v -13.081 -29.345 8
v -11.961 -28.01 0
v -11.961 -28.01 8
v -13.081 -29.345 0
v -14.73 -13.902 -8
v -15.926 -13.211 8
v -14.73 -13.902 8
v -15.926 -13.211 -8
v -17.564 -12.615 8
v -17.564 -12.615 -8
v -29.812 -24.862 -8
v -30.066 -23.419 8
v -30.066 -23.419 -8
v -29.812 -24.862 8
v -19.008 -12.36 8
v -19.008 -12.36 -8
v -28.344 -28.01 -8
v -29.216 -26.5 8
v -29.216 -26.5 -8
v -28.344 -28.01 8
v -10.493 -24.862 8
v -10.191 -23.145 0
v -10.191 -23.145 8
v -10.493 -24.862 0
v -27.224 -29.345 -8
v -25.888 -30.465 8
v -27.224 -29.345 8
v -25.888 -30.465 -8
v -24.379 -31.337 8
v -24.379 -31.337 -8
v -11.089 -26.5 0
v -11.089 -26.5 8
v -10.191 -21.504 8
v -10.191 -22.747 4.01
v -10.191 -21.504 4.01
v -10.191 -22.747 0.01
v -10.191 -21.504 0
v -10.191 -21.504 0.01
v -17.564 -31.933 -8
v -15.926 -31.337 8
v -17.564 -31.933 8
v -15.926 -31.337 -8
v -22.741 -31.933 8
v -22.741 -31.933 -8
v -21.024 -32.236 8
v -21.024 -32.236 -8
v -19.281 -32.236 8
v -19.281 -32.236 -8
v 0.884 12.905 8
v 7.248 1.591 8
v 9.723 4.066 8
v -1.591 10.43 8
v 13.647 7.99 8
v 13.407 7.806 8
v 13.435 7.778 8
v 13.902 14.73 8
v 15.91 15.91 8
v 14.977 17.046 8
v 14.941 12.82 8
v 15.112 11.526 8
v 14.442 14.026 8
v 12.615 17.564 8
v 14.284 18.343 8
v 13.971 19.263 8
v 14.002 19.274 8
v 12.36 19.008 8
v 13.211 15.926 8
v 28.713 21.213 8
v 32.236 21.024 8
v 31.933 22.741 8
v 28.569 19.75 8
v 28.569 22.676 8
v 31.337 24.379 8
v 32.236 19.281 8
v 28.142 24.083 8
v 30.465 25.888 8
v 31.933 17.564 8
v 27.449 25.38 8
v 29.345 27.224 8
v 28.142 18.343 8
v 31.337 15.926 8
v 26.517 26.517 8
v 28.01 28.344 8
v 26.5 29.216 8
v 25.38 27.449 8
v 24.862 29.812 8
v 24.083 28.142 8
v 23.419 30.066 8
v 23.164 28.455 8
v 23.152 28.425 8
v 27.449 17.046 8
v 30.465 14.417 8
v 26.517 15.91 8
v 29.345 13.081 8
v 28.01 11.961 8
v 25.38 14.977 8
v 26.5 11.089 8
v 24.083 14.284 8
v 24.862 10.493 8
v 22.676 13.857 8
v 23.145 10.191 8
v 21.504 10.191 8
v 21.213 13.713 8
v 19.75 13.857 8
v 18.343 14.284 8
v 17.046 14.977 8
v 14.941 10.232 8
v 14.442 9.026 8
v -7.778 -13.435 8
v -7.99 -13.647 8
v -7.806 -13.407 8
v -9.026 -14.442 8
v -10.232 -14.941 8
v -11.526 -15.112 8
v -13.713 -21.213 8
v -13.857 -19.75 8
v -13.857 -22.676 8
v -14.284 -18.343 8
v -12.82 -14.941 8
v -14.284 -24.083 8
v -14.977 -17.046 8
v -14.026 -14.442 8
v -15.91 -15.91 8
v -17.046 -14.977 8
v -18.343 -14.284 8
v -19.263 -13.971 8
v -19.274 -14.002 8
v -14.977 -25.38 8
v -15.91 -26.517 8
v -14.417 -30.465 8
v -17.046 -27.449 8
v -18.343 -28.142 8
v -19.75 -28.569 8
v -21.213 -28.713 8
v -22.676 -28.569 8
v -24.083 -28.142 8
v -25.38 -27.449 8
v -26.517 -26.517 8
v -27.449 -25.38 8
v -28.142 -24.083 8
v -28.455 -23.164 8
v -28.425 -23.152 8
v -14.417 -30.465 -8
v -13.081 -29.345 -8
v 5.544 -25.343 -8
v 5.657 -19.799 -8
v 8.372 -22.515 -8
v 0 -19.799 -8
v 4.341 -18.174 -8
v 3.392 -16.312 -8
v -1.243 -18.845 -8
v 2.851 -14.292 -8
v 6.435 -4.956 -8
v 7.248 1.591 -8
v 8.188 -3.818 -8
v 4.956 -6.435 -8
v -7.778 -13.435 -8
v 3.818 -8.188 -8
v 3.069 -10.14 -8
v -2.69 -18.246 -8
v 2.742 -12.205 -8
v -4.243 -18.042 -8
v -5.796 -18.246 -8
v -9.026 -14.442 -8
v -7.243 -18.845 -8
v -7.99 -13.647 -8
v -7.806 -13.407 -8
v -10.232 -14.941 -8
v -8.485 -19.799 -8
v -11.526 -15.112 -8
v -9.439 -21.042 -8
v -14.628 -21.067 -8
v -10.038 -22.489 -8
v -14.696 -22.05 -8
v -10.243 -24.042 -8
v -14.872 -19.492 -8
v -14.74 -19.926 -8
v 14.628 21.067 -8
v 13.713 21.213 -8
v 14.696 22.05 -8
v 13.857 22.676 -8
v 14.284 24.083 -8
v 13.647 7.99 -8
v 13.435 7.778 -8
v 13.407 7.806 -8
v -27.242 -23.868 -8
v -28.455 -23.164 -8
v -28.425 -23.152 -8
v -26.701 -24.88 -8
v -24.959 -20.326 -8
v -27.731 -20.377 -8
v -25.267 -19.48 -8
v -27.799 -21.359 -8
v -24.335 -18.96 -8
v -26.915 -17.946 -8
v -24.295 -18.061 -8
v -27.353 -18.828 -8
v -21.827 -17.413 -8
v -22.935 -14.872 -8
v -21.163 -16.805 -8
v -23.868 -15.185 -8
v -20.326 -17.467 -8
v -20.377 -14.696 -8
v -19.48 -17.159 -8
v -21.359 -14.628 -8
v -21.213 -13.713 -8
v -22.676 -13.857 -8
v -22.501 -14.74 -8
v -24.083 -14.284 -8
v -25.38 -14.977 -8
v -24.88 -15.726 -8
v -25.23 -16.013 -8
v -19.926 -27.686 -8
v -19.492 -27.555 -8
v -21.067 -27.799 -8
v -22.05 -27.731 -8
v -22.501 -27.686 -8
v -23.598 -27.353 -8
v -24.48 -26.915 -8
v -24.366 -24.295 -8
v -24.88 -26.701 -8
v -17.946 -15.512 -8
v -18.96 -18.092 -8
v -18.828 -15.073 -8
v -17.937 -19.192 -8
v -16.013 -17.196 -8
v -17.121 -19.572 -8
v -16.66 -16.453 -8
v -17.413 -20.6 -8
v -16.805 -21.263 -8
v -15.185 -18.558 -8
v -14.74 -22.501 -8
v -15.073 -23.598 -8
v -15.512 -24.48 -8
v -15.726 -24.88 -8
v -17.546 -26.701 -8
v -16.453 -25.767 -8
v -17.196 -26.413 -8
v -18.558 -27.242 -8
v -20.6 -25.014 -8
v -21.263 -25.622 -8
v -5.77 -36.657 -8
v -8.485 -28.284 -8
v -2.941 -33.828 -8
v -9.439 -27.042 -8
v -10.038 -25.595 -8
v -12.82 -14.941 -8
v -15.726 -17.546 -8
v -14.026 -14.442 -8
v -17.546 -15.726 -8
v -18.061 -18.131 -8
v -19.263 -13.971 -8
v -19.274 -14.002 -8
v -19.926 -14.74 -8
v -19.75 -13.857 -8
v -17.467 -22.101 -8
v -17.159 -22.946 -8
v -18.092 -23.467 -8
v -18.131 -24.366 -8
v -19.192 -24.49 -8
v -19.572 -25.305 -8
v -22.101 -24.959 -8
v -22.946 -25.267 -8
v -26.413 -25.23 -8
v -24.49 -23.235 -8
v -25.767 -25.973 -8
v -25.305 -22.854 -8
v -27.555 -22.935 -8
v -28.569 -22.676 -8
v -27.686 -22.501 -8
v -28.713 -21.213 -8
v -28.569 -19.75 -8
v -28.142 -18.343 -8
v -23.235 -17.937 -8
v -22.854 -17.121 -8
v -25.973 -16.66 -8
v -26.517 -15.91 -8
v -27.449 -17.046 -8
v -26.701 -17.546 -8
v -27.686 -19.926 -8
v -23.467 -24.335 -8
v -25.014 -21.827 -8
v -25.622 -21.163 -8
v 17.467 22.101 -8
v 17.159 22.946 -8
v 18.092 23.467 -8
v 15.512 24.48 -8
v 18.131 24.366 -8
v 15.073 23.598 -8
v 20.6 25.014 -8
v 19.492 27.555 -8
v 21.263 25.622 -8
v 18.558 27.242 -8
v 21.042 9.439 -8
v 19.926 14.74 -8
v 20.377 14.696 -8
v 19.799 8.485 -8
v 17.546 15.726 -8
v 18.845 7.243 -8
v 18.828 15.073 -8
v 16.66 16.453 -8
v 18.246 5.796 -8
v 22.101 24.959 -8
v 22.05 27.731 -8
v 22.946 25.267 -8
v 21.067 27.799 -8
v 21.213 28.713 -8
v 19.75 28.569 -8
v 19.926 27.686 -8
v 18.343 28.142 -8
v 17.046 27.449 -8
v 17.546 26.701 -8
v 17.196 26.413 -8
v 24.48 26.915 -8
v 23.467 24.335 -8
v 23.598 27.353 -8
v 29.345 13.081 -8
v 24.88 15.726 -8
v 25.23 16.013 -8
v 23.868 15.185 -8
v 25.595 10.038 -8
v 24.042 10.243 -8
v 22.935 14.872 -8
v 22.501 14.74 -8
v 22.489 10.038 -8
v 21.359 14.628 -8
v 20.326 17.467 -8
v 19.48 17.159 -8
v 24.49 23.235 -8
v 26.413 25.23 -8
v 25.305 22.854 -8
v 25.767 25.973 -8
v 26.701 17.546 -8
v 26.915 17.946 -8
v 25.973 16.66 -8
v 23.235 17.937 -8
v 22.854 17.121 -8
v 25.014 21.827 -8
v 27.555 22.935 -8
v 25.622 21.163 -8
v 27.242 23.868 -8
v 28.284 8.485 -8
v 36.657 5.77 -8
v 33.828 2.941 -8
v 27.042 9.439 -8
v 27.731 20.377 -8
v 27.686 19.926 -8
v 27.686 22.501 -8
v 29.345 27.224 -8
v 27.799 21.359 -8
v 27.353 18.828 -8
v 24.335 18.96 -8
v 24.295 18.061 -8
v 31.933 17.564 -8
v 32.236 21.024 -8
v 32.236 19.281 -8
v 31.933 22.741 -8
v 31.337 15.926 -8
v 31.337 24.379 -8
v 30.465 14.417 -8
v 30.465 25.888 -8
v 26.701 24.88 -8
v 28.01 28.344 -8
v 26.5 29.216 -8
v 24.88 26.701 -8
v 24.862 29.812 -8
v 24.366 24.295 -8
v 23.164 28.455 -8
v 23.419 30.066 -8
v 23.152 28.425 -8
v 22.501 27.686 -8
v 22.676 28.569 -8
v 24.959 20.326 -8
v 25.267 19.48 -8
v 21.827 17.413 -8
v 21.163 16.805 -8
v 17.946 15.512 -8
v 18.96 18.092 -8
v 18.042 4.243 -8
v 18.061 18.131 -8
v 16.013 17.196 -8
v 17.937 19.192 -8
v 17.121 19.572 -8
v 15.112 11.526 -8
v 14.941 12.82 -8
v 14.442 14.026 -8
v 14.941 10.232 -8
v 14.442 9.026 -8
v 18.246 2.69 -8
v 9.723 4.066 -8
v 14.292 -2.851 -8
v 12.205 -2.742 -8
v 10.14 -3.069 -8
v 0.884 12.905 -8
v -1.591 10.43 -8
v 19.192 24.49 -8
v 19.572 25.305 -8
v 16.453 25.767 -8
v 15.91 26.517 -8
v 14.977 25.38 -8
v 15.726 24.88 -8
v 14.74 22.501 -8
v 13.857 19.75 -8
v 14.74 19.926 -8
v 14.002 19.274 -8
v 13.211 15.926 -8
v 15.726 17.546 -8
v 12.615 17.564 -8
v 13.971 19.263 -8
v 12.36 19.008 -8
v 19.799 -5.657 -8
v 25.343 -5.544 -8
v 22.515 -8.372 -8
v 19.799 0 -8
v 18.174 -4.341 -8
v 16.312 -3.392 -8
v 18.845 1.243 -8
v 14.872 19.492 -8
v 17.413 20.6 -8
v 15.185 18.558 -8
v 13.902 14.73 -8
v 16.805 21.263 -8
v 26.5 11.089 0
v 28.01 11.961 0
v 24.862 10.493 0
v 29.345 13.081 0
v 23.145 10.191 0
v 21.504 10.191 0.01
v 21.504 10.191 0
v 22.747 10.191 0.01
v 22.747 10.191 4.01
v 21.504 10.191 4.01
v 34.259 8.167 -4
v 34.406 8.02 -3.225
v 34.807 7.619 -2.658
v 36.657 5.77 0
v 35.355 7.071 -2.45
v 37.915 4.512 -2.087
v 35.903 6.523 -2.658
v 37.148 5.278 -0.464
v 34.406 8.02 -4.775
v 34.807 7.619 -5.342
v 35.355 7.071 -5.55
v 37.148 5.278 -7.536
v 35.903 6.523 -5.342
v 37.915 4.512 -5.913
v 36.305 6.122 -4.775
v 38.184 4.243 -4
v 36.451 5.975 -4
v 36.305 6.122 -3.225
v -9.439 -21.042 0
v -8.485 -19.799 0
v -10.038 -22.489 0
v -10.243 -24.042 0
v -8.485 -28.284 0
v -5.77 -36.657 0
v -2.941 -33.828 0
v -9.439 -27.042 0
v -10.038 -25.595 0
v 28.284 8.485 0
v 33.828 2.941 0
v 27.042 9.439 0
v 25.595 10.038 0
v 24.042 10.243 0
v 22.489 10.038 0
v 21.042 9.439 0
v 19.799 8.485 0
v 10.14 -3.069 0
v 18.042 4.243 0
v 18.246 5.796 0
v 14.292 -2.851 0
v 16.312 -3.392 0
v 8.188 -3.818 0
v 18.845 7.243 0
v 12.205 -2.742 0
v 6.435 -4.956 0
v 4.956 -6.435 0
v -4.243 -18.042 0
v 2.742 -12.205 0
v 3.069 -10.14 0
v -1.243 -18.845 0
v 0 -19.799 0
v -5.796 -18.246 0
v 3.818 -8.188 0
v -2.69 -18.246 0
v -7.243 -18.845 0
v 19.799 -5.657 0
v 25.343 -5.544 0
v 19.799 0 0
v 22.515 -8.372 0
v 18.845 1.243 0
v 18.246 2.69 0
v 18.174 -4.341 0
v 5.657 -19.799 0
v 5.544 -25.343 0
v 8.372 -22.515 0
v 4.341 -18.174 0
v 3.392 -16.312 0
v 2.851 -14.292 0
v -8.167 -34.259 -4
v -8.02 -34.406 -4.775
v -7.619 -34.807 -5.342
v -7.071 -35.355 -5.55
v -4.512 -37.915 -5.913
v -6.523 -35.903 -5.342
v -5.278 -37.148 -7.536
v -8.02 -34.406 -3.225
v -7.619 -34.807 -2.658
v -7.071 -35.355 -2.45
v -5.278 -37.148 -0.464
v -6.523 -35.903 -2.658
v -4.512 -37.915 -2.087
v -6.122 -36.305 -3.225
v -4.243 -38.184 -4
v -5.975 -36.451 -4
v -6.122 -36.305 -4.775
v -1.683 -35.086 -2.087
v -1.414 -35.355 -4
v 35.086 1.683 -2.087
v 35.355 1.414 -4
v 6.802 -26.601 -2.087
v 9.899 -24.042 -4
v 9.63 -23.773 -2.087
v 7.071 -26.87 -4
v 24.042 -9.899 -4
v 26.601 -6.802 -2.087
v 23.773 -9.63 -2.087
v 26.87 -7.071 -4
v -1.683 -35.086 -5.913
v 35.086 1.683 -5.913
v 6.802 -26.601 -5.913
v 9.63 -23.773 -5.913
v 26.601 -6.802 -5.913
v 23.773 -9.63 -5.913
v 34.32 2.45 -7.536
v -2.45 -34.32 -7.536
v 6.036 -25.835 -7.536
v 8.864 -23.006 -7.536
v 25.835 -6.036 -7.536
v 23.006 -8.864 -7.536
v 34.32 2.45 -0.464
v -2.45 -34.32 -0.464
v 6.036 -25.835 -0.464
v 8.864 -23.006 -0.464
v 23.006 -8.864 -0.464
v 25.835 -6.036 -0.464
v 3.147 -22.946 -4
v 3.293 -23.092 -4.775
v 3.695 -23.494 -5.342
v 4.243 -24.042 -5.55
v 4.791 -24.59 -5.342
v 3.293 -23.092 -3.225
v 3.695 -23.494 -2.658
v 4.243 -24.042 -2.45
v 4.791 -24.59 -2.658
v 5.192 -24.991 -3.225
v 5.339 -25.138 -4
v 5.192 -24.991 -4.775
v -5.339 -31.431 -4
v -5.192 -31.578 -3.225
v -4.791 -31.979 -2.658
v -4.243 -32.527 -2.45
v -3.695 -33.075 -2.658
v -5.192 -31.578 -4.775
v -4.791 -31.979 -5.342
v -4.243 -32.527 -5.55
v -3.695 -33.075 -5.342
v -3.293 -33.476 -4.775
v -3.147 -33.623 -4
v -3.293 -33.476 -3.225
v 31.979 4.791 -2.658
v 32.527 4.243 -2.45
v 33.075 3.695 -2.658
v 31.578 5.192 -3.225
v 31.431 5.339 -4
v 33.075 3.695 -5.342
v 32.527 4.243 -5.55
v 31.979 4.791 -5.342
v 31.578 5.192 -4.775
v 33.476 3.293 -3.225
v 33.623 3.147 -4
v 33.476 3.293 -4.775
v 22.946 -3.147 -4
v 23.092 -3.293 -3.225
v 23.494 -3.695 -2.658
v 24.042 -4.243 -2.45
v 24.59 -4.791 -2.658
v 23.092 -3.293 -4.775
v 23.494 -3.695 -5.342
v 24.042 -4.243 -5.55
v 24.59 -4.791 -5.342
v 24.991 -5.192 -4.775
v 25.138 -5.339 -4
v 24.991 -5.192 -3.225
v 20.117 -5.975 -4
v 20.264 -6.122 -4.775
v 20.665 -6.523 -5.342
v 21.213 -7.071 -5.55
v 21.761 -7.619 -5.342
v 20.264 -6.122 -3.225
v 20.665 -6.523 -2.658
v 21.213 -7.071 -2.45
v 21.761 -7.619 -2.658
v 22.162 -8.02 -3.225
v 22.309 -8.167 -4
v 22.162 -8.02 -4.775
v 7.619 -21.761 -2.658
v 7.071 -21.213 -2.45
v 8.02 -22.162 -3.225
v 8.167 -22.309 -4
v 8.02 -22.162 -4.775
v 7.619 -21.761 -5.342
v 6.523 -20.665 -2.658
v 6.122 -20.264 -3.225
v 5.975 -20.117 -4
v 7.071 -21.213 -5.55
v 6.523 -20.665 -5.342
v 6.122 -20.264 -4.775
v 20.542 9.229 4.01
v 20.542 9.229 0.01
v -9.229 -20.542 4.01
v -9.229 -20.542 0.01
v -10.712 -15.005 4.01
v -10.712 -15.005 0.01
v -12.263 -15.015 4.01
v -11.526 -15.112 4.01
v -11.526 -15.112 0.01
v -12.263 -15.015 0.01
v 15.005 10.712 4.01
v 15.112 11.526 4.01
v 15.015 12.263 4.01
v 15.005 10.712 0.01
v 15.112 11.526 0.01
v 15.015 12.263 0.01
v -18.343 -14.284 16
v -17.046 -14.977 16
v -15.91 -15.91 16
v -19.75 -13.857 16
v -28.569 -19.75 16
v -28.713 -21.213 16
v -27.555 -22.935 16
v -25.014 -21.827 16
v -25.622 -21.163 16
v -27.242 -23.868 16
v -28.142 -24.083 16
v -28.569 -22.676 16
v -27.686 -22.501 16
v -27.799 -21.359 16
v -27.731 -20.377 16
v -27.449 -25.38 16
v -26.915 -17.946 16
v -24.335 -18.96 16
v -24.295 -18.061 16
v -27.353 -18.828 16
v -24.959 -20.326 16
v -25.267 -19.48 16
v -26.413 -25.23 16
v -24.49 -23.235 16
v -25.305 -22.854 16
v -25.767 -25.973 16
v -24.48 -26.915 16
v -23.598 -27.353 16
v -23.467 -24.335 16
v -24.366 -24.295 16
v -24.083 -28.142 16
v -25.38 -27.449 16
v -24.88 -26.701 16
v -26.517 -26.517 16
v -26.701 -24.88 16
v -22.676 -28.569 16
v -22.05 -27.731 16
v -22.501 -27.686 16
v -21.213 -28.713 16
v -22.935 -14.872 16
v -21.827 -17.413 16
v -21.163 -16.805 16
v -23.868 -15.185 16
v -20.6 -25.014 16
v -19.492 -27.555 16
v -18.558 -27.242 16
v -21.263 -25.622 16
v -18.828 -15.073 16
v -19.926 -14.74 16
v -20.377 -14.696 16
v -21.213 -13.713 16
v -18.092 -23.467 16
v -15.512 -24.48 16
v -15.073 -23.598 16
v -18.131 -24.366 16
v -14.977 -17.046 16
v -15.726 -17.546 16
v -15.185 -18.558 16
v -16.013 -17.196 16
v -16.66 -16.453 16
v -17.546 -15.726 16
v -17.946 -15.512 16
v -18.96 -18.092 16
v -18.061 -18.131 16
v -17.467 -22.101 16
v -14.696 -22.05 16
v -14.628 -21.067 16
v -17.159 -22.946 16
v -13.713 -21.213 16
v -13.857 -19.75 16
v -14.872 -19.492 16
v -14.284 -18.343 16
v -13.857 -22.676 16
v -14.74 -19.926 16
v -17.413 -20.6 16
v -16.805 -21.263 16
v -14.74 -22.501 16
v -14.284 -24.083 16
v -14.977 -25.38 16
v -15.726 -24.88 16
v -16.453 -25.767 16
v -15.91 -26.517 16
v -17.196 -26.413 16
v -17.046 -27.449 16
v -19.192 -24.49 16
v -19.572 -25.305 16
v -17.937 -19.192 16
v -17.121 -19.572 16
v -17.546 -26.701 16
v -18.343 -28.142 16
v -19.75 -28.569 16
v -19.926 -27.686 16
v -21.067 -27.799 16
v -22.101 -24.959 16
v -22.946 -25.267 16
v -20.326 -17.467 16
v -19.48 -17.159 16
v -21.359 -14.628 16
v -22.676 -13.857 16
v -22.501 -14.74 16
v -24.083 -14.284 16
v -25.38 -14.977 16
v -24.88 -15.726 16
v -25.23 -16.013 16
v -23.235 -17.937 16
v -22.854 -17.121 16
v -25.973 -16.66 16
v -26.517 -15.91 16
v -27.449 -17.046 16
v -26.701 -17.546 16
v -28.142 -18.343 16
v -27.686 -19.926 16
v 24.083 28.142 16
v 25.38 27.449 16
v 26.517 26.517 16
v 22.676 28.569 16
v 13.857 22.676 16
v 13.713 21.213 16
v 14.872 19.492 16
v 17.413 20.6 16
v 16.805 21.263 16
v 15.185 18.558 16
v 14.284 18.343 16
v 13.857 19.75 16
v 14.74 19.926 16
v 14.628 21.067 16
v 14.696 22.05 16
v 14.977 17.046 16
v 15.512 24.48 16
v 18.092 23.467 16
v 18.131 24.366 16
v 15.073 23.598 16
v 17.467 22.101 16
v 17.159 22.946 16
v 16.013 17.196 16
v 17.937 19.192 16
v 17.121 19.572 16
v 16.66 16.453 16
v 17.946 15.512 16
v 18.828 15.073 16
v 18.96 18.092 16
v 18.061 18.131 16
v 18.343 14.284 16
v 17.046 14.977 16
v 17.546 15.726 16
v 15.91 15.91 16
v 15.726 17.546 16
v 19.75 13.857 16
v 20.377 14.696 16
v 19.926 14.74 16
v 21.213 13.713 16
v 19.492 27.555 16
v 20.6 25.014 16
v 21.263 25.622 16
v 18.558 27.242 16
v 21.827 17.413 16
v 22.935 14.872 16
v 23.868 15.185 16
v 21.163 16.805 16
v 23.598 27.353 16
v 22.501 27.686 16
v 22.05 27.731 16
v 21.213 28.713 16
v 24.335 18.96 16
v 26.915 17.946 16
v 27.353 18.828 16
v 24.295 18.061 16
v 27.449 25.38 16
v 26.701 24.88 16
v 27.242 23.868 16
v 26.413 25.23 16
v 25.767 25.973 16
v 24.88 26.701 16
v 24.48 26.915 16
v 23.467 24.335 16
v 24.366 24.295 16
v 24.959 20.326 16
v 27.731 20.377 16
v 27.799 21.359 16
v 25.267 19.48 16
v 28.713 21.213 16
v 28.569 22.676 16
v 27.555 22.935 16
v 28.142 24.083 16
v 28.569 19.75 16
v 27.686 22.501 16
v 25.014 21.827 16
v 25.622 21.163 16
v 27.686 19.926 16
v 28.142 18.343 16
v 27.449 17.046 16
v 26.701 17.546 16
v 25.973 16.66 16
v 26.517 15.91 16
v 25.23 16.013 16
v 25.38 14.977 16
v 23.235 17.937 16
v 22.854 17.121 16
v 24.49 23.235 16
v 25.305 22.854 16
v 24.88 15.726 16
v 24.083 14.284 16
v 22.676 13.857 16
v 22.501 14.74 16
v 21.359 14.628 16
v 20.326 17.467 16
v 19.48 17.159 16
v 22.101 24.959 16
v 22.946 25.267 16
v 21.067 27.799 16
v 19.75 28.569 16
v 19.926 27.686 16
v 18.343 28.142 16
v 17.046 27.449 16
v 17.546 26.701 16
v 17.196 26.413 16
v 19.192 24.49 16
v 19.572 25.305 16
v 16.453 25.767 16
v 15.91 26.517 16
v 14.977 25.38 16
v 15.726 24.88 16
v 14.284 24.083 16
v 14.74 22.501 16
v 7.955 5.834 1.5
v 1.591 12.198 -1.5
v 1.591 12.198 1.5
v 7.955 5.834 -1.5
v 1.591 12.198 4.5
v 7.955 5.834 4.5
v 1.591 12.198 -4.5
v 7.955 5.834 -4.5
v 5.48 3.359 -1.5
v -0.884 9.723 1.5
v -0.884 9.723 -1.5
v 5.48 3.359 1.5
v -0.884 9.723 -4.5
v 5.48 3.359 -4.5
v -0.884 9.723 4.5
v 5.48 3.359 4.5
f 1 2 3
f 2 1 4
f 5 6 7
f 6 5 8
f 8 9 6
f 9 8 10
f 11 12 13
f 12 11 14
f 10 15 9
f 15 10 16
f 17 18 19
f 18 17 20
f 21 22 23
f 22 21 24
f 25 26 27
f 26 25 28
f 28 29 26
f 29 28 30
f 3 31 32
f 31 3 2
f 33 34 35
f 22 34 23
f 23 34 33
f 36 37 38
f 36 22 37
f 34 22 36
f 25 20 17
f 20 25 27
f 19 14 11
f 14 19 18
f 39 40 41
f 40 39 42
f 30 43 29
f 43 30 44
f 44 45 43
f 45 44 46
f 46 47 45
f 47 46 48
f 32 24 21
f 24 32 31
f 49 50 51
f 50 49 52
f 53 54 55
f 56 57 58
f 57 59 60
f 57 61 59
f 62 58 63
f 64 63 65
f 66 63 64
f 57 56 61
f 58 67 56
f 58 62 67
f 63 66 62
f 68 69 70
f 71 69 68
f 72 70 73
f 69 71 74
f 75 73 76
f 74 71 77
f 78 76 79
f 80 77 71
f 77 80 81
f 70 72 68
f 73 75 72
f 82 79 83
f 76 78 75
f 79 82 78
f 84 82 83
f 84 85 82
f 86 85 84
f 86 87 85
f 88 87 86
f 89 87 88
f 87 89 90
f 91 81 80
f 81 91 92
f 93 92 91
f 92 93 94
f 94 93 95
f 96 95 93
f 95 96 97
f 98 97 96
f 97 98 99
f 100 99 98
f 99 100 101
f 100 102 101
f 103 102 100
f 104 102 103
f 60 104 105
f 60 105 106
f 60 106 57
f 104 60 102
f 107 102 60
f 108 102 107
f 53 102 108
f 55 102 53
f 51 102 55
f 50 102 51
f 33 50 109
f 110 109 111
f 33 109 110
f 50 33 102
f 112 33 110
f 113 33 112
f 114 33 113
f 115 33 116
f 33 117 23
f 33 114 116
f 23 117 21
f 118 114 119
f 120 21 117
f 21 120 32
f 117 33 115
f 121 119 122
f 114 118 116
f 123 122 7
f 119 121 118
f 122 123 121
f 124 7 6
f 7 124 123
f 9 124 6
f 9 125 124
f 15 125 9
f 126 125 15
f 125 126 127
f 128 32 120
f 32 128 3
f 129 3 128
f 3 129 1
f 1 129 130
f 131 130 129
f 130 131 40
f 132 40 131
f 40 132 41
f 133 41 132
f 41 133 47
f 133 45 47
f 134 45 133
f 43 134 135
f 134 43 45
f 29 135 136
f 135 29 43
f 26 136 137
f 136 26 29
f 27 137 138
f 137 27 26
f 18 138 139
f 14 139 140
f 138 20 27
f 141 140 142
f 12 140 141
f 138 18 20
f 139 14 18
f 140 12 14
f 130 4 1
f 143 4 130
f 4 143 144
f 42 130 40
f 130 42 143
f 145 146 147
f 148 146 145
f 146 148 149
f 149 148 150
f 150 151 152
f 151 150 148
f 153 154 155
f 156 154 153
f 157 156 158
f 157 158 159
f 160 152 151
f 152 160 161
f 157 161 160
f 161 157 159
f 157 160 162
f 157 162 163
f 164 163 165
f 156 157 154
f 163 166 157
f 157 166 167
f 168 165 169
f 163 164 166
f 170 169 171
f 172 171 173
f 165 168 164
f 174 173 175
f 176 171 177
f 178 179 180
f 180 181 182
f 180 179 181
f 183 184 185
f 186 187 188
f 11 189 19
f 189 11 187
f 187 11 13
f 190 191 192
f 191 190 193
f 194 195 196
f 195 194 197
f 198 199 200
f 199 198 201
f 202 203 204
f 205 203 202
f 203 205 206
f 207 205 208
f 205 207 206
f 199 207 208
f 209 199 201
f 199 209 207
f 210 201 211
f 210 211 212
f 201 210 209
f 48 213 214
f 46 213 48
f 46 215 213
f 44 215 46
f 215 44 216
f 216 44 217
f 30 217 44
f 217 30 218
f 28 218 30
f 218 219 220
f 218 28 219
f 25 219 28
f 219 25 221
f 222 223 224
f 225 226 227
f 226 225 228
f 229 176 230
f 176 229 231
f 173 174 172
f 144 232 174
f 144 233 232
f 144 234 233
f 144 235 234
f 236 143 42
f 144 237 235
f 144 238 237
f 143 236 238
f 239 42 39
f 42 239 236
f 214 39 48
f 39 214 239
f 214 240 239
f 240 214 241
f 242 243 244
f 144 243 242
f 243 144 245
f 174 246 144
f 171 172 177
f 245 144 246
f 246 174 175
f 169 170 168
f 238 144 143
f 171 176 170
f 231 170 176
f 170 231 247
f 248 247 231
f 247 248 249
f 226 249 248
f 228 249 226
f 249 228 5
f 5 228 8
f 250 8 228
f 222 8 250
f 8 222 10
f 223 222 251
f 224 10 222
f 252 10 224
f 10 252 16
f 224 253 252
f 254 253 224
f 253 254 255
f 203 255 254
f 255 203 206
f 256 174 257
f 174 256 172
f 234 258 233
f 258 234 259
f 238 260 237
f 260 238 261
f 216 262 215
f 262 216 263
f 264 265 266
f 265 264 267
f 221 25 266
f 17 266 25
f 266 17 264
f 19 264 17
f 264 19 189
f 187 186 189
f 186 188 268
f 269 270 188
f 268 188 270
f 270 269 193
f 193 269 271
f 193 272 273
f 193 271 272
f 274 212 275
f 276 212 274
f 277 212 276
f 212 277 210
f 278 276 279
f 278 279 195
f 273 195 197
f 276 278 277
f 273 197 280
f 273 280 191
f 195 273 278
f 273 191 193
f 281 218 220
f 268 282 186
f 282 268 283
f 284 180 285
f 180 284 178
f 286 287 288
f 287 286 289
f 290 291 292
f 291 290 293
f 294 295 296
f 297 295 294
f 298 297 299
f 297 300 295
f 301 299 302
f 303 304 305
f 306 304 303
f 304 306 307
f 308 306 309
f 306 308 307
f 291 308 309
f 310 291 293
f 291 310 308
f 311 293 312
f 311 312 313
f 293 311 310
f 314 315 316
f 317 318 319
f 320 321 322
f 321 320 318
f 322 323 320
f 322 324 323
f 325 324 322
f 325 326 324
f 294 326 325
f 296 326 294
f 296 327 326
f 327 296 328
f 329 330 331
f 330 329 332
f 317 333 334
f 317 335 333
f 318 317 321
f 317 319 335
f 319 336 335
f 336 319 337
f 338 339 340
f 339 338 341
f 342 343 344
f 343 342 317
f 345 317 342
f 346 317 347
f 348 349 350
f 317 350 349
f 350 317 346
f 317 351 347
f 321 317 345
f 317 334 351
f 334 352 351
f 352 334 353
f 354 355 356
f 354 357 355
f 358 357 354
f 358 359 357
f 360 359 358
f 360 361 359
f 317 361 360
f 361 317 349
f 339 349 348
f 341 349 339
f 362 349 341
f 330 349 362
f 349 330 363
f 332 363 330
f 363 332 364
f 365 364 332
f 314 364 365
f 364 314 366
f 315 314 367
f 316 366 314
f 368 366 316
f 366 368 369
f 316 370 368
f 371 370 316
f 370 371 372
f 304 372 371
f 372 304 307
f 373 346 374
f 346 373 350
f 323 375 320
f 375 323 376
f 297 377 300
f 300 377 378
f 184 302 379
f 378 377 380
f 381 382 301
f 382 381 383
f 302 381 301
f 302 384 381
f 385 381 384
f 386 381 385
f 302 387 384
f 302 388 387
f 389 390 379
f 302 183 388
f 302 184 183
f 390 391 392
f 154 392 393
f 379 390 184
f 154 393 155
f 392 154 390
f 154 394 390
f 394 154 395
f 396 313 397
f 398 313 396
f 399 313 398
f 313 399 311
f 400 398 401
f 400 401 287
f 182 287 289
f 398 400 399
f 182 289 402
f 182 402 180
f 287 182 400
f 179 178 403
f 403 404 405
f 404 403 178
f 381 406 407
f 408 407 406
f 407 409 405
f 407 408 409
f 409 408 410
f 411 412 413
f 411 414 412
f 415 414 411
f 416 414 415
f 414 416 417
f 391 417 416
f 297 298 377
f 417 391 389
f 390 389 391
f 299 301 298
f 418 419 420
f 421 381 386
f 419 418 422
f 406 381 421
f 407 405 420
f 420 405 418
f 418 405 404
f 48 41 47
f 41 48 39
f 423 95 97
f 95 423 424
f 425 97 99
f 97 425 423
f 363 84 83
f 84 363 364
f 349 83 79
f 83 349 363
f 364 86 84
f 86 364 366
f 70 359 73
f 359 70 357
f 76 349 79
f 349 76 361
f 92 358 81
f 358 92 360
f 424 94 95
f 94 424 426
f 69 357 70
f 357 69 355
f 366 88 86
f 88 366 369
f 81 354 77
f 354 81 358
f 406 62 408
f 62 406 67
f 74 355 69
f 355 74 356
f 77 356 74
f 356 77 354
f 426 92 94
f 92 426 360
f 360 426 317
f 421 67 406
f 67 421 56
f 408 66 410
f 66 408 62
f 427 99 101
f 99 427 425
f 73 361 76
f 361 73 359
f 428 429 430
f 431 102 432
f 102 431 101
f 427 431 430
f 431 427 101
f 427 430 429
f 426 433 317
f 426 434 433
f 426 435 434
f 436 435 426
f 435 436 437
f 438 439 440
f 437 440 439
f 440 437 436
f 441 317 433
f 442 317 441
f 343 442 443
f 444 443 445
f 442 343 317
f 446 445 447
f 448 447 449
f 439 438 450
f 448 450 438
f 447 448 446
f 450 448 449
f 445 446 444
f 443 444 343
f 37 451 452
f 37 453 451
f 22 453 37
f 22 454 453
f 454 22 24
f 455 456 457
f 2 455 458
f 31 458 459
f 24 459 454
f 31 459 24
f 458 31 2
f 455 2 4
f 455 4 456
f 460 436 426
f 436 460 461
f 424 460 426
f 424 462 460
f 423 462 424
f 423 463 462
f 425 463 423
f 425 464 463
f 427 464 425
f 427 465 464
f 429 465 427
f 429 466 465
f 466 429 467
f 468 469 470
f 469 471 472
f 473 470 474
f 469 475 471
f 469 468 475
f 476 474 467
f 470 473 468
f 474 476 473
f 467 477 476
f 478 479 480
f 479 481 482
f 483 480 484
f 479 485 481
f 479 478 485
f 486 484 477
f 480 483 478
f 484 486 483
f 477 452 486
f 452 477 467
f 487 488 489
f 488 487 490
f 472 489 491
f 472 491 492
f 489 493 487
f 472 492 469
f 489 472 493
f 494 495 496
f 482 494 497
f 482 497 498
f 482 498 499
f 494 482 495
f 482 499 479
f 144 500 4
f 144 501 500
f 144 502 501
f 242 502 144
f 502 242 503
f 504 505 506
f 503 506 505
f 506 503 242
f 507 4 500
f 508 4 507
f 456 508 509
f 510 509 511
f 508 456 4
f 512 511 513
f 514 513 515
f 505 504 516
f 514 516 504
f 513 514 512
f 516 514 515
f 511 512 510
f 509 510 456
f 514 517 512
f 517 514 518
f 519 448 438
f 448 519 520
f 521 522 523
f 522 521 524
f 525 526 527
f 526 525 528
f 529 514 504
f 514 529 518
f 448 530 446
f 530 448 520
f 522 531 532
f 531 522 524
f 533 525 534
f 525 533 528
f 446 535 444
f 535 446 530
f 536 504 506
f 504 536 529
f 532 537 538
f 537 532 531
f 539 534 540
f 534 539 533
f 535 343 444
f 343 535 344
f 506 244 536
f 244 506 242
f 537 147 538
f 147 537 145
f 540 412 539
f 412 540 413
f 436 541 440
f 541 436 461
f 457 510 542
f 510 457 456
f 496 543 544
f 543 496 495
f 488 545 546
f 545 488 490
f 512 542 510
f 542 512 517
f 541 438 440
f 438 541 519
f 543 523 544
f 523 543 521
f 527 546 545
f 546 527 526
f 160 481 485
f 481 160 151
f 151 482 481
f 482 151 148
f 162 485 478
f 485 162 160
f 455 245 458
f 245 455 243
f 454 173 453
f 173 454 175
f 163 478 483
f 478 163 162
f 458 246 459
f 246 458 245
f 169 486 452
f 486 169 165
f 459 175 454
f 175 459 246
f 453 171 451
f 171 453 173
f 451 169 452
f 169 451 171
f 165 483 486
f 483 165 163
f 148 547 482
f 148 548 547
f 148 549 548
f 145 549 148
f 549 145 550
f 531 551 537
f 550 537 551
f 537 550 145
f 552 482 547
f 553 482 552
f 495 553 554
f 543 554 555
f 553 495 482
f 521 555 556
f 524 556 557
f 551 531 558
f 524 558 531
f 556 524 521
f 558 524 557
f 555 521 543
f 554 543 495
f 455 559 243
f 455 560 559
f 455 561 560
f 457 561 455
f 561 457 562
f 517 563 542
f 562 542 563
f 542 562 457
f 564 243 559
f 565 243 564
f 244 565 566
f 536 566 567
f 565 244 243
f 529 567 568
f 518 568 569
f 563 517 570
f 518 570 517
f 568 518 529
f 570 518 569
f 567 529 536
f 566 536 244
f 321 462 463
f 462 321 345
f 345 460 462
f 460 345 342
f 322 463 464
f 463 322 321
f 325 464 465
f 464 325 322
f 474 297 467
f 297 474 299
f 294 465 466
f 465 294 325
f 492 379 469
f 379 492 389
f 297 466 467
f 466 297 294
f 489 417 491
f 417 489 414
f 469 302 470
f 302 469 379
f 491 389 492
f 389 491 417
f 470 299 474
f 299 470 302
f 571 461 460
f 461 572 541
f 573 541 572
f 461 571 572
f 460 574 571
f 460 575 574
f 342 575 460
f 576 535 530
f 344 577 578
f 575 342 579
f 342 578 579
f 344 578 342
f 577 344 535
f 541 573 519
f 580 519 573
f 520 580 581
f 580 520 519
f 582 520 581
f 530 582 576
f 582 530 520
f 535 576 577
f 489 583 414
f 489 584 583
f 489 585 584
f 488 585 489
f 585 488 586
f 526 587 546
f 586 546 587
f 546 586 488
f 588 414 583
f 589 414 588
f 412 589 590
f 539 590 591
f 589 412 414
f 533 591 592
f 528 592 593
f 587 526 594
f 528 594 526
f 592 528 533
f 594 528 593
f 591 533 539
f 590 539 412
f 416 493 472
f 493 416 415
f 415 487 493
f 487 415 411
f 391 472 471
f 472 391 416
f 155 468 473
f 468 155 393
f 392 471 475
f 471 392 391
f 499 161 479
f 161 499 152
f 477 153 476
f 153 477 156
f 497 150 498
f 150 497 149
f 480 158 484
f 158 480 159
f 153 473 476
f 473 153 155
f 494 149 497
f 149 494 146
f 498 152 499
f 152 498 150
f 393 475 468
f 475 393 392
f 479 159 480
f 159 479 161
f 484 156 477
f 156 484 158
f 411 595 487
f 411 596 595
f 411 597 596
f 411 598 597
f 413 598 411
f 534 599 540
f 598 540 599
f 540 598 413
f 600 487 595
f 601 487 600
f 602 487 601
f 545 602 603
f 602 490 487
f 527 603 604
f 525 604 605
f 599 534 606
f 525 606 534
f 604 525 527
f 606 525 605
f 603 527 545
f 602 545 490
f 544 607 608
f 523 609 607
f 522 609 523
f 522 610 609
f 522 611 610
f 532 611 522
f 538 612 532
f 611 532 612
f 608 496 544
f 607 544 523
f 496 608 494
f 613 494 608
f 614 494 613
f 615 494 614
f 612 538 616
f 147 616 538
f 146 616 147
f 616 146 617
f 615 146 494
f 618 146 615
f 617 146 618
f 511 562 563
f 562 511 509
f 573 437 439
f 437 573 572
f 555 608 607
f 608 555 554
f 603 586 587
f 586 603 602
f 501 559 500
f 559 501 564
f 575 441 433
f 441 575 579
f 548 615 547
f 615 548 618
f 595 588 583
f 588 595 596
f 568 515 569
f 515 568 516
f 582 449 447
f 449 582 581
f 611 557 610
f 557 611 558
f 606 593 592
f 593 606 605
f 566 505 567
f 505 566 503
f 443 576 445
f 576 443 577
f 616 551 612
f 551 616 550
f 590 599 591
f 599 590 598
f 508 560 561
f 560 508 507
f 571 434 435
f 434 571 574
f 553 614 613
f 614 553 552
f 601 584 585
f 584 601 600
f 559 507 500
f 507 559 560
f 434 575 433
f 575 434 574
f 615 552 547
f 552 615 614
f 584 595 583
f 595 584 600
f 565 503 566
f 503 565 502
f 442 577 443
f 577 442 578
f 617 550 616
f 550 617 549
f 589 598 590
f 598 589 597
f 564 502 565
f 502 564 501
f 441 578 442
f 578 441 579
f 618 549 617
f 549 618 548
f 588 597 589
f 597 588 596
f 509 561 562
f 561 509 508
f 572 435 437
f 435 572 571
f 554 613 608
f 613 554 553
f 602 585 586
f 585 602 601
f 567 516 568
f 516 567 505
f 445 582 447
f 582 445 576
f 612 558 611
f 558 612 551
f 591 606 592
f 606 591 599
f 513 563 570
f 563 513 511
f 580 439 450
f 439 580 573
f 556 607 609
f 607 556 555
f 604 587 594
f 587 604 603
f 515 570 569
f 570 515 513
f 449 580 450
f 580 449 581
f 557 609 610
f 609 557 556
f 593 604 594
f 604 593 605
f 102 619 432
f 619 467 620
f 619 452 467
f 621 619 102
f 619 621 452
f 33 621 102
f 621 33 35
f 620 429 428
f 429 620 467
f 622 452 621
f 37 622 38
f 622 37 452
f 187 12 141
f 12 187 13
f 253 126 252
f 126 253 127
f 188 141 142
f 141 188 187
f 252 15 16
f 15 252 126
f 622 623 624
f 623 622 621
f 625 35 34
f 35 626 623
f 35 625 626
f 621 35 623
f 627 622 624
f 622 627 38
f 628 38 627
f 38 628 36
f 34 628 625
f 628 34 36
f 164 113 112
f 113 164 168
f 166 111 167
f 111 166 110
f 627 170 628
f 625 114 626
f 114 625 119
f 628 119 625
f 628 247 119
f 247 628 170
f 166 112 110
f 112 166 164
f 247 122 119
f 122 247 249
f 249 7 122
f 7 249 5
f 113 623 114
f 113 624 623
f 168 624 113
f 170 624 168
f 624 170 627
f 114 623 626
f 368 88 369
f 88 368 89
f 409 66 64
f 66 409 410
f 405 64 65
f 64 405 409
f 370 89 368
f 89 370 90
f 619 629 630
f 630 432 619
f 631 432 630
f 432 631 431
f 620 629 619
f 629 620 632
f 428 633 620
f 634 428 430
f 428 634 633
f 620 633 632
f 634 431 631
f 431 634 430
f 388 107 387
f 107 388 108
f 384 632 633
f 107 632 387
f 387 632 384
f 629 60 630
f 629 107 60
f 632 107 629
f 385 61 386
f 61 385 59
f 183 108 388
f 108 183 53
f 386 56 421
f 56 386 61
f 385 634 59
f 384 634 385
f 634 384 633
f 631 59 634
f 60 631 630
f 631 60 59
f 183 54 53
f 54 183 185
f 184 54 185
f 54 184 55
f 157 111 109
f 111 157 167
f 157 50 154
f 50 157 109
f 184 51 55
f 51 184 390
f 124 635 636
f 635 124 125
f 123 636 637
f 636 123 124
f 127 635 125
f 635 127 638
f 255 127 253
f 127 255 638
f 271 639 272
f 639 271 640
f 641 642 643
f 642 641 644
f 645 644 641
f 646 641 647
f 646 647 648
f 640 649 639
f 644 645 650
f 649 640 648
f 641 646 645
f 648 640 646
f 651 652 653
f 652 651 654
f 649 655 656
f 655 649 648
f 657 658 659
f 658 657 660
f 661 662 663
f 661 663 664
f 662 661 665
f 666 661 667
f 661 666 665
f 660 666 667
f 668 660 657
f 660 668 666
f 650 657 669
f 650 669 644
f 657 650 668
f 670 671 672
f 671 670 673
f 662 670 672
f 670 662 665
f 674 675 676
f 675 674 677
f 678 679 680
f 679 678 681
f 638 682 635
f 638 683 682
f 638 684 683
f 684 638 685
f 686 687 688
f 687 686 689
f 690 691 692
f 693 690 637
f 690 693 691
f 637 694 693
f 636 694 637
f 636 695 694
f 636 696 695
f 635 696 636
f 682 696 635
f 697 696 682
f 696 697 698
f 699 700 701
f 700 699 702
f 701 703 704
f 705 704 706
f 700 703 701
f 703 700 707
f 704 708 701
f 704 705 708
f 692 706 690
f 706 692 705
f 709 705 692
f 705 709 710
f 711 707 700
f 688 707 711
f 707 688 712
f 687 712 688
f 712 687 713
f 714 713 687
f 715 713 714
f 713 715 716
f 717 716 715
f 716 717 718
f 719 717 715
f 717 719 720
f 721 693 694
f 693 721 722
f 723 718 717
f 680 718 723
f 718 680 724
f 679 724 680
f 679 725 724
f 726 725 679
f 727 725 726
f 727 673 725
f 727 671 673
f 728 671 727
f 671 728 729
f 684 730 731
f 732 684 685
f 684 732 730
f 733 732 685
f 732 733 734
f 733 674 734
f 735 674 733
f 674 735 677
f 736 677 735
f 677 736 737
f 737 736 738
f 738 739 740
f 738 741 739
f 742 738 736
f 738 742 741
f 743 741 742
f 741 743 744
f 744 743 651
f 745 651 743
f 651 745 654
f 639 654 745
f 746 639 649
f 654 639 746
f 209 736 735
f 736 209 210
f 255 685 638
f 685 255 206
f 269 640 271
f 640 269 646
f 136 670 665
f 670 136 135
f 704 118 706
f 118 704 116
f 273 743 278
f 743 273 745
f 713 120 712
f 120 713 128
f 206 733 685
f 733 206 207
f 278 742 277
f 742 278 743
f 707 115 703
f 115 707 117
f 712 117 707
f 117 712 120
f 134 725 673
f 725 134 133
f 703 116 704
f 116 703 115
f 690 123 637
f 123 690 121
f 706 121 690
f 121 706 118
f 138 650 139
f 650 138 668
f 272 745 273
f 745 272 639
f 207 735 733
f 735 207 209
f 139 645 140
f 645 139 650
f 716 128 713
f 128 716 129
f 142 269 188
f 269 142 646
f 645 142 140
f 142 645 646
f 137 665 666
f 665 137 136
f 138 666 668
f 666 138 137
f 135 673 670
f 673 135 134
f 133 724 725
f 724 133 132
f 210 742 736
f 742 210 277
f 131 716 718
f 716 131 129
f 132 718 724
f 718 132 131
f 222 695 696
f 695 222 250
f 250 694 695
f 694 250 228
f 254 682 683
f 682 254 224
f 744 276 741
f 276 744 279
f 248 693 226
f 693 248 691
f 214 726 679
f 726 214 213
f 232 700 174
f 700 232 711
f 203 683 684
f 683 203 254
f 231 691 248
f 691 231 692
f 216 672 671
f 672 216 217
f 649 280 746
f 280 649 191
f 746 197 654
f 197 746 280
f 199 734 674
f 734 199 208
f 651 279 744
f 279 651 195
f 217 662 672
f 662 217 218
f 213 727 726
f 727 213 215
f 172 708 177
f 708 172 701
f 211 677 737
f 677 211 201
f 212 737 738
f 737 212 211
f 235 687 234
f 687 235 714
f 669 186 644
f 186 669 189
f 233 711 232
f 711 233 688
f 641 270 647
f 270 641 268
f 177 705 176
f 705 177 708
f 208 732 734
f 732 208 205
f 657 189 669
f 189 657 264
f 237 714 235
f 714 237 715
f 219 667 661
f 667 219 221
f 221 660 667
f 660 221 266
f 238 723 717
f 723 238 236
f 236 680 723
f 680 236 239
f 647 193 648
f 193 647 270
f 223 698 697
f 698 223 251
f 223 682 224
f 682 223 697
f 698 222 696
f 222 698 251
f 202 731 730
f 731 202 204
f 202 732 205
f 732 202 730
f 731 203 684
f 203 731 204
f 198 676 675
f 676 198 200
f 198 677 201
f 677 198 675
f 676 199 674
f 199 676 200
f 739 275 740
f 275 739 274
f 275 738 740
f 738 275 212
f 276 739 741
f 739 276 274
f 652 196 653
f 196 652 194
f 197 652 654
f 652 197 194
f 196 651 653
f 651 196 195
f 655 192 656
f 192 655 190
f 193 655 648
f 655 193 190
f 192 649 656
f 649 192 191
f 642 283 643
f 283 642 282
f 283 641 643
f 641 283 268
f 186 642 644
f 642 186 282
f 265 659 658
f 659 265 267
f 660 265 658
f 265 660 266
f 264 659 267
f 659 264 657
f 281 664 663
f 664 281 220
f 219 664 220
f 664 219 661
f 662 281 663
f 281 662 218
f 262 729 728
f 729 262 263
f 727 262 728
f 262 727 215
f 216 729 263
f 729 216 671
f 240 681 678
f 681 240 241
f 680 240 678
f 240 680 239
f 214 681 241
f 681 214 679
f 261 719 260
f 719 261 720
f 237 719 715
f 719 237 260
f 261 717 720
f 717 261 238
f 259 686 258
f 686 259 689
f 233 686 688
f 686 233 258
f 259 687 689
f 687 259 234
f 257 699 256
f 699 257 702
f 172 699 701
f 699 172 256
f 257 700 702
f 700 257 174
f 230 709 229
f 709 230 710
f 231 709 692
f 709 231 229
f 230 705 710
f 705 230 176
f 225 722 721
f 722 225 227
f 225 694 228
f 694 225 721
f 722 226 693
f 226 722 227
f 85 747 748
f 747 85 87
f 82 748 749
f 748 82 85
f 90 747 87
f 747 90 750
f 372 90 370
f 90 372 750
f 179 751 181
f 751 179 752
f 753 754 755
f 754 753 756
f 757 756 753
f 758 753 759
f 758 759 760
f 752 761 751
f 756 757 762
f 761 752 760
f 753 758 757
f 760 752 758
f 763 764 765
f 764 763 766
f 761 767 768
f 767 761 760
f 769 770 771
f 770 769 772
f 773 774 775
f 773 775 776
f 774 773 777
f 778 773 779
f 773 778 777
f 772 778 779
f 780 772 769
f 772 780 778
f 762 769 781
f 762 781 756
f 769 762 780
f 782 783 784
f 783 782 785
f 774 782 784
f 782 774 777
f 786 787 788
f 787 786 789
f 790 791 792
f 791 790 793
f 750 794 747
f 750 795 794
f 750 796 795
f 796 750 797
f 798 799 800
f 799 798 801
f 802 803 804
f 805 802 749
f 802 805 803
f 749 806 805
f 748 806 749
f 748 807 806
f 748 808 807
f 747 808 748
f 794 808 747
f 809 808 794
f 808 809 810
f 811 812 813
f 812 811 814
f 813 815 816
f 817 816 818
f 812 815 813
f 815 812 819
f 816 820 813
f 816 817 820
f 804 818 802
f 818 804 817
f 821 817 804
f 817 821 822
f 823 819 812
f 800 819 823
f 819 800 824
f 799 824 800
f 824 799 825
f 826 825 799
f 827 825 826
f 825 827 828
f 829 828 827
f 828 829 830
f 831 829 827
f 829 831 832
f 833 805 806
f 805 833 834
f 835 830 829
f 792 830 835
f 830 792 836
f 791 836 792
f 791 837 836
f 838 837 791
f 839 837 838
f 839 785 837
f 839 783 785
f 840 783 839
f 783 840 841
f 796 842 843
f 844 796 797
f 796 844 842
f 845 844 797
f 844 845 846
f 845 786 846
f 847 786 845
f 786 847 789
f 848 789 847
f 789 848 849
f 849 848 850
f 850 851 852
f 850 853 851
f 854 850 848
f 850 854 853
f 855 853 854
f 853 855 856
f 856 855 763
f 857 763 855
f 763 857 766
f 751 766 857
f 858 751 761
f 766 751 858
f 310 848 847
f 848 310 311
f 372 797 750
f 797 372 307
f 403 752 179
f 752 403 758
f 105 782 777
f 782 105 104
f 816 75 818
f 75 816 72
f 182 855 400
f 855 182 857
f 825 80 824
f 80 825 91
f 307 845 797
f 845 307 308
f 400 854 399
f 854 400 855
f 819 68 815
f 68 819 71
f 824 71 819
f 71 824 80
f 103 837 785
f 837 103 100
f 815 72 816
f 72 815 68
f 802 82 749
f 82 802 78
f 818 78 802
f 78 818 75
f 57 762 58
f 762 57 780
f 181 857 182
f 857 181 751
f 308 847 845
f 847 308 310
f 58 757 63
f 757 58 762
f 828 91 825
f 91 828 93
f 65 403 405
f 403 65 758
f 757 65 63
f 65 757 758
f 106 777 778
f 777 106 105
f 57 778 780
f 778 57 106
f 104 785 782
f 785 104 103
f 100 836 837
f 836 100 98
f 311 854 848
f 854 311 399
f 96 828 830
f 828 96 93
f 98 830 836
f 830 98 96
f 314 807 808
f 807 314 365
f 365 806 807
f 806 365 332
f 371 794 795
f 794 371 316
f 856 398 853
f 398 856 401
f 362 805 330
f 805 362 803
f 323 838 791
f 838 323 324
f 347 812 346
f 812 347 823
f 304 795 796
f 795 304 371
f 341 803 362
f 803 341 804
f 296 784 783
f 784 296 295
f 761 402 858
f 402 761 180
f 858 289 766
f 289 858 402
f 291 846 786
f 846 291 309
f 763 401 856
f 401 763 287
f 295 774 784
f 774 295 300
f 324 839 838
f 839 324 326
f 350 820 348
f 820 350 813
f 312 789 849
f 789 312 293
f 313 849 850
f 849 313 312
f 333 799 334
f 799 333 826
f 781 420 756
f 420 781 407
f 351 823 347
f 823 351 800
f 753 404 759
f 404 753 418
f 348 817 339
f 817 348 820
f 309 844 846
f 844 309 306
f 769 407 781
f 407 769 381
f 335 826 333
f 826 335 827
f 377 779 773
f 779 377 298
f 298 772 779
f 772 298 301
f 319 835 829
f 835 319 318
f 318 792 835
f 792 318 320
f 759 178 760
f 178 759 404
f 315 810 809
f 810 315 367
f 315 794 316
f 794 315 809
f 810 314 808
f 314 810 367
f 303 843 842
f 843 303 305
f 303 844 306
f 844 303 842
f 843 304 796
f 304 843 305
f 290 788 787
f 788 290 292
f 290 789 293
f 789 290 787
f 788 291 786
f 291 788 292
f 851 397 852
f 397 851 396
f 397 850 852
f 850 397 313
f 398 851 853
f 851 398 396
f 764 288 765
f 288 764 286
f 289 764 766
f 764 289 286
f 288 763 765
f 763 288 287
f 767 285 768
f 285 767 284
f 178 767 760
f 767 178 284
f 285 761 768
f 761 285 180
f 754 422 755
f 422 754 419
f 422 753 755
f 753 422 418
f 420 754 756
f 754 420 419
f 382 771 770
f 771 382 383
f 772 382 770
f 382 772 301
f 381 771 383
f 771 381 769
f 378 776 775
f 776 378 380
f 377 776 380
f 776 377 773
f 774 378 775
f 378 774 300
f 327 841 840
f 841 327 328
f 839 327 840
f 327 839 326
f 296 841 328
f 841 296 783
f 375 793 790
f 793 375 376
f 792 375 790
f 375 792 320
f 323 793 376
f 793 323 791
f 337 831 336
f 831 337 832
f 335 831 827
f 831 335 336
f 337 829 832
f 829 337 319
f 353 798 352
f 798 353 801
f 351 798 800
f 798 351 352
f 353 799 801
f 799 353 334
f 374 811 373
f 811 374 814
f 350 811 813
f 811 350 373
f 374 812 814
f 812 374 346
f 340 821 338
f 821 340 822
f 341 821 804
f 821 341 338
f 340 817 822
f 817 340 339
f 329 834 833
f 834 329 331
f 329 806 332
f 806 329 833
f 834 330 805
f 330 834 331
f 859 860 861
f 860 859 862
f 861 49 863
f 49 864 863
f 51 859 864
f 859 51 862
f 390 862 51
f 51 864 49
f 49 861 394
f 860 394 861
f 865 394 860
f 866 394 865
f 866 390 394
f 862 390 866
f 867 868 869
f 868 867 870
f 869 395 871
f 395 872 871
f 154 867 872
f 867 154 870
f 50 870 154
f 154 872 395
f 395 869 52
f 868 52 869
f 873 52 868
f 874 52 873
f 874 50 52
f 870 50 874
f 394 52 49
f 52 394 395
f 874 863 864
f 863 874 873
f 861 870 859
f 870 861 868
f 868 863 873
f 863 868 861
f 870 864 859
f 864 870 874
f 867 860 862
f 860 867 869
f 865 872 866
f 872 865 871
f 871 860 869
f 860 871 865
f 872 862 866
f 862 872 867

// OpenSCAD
// file: linear_bushing.scad
module linear_bushing(inside_diameter, inside_factor, outside_diameter,
					  height, sides, angle, wall) {
	intersection() {
		union() {
			difference() {
				cylinder(r=outside_diameter/2, h=height,
						 center=true, $fn=sides*2);
				cylinder(r=outside_diameter/2-wall, h=height+1,
						 center=true, $fn=sides*2);
			}
			for (side = [1 : sides]) {
				rotate([0, 0, 360 * side / sides]) {
					translate([outside_diameter/2, 0, 0])
						rotate([0, 0, angle])
						cube([(outside_diameter-inside_diameter*inside_factor)
							  /cos(angle), wall, height], center=true);
				}
			}
		}
		cylinder(r=outside_diameter/2, h=height, center=true, $fn=sides*2);
	}
}

// This will produce a test grid for wall thickness and inside_factor, then
// you can try which size fits best for your printer and slicer settings.

for (x = [0 : 0]) {
	translate([20*x, 0, 0]) {
		linear_bushing(inside_diameter=8, inside_factor=0.975+0.005*x,
					   outside_diameter=15,
					   height=24, sides=16, angle=20, wall=0.9);
	}
}
// main file
use <linear_bushing.scad>;

height = 16;

offset = 20;
cutout = 12;

module parallel_joints() {
	difference() {
		union() {
			translate([0, 1, 0])
			intersection() {
				cube([60, 20, 8], center=true);
				rotate([0, 90]) cylinder(r=5, h=60, center=true);
			}
			translate([0, 10, 0]) cube([60, 20, 8], center=true);
		}
		rotate([0, 90, 0]) cylinder(r=1.55, h=80, center=true, $fn=12);

		for (x = [-offset, offset]) {
			translate([x, 6, 0])
				cylinder(r=cutout/2, h=10, center=true, $fn=24);
			translate([x, -4, 0])
				cube([cutout, 20, 10], center=true);
		}
		translate([0, 2, 0]) {
			cylinder(r=10, h=10, center=true);
			translate([0, -5, 0]) cube([20, 10, 10], center=true);
		}
	}
}

rotate([0, 0, 45])
difference() {
union() {
	difference() {
		union() {
			translate([0, -4, 0]) cube([60, 8, height], center=true);

			for (x = [-30, 30]) {
				translate([x, -1.5, 0])
					cylinder(r=10, h=height, center=true, $fn=36);
			}

			translate([0, -20, -height/2+4]) parallel_joints();
		}
		for (x = [-30, 30]) {
			translate([x, 0, 0])
				cylinder(r=7, h=height+1, center=true);
			translate([x, 15, 0])
				cylinder(r=13, h=height+1, center=true);
			translate([x, -22, 2.01]) rotate([0, 0, x])
				cube([1.5, 60, 4], center=true);
			translate([x*0.51, 1, 0])
				cylinder(r=5, h=height+1, center=true, $fn=24);
		}

		cube([30, 8, height+1], center=true);
	}
	for (x = [-30, 30]) {
		translate([x, 0, 4])
			linear_bushing(inside_diameter=8, inside_factor=0.975,
						   outside_diameter=15,
						   height=24, sides=16, angle=20, wall=0.9);
	}
	translate([8, 2, 0]) cube([3.5, 13, height], center=true);
}
	translate([8, 3, 3]) cube([5, 9, 3], center=true);
	translate([8, 3, -3]) cube([5, 9, 3], center=true);
}
